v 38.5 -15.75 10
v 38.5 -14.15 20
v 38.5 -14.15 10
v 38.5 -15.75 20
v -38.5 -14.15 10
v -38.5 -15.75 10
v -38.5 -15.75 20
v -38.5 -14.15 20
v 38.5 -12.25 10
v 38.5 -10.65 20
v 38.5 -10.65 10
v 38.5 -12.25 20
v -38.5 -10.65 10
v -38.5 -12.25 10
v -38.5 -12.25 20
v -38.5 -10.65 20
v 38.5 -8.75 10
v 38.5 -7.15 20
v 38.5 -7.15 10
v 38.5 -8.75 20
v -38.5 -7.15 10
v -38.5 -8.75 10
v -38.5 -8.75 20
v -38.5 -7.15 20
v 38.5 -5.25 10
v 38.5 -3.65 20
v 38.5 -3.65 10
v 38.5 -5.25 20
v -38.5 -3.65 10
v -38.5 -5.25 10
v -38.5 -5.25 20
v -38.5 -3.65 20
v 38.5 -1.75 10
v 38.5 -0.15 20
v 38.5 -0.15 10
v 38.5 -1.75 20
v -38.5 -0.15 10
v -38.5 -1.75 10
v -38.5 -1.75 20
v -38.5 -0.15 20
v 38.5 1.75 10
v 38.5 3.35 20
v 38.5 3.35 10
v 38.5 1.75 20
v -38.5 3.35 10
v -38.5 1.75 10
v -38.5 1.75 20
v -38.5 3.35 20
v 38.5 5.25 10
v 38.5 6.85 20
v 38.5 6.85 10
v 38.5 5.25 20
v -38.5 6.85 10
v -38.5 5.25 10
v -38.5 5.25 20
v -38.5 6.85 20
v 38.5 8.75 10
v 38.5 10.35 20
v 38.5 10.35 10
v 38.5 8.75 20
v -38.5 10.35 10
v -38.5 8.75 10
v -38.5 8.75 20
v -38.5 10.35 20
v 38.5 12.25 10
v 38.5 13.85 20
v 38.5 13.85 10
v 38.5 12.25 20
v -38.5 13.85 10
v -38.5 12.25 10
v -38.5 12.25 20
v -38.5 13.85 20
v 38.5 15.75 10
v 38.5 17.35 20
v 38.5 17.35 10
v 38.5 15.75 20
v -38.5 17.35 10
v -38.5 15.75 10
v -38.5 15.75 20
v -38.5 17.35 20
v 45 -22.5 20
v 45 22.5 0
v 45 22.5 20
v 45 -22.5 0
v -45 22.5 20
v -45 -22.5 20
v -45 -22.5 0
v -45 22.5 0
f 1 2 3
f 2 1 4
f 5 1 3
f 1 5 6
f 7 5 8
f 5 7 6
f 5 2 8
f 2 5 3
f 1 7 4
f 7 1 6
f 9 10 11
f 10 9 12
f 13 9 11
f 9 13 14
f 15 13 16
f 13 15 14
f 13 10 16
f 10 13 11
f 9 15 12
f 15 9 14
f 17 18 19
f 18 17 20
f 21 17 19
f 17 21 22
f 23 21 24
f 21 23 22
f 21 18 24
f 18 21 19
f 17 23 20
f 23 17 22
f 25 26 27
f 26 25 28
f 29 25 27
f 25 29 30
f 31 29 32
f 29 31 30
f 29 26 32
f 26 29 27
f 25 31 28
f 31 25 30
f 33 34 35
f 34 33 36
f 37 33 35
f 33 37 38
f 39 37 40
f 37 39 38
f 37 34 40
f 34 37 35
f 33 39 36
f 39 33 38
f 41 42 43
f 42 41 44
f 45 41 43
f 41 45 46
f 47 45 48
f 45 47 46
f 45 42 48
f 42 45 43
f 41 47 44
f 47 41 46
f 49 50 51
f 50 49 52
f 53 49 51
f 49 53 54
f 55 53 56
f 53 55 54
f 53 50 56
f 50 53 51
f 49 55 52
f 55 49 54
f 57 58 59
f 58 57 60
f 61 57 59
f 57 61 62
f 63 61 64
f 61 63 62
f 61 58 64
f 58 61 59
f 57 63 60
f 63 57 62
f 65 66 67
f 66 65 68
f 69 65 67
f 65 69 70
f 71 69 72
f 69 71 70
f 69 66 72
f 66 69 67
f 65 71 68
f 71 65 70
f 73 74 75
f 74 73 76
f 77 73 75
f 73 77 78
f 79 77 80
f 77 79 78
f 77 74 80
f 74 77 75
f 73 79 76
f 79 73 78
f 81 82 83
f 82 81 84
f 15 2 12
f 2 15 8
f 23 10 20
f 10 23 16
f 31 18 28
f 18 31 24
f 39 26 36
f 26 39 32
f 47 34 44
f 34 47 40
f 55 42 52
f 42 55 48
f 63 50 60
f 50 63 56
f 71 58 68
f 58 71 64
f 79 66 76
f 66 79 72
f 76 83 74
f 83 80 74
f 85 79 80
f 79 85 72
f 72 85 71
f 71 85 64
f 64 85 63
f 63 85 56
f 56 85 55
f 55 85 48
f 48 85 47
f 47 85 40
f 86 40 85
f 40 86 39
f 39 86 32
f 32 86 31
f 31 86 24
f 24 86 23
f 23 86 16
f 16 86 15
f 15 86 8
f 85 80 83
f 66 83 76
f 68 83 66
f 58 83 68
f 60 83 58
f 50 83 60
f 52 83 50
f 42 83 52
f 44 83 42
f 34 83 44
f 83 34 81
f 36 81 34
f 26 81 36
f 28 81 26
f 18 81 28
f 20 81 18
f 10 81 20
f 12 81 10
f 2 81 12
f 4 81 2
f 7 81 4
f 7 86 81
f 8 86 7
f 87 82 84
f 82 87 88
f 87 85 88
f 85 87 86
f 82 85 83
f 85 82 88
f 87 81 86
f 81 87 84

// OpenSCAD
// Microscope slide drying rack
// Print orientation: base block on the bed (z = 0), slots open upward.

// ---------------- Parameters ----------------
block_len    = 90;    // block length along X (mm)
block_wid    = 45;    // block width along Y (mm)
block_h      = 20;    // block height along Z (mm)

slot_len     = 77;    // slot length along X (mm)
slot_w       = 1.6;   // slot width along Y (mm)
slot_depth   = 10;    // slot depth from top face (mm)
slot_count   = 10;    // number of slots
slot_pitch   = 3.5;   // centre-to-centre spacing in Y (mm)

eps          = 0.5;   // overshoot so cutters pass the top face

$fn = 64;

// ---------------- Model ----------------
difference() {
    // Base block, centred in X and Y
    translate([-block_len/2, -block_wid/2, 0])
        cube([block_len, block_wid, block_h]);

    // Slot group, centred on the block in X and Y
    for (i = [0 : slot_count - 1]) {
        y = (i - (slot_count - 1)/2) * slot_pitch;
        translate([-slot_len/2, y, block_h - slot_depth])
            cube([slot_len, slot_w, slot_depth + eps]);
    }
}
